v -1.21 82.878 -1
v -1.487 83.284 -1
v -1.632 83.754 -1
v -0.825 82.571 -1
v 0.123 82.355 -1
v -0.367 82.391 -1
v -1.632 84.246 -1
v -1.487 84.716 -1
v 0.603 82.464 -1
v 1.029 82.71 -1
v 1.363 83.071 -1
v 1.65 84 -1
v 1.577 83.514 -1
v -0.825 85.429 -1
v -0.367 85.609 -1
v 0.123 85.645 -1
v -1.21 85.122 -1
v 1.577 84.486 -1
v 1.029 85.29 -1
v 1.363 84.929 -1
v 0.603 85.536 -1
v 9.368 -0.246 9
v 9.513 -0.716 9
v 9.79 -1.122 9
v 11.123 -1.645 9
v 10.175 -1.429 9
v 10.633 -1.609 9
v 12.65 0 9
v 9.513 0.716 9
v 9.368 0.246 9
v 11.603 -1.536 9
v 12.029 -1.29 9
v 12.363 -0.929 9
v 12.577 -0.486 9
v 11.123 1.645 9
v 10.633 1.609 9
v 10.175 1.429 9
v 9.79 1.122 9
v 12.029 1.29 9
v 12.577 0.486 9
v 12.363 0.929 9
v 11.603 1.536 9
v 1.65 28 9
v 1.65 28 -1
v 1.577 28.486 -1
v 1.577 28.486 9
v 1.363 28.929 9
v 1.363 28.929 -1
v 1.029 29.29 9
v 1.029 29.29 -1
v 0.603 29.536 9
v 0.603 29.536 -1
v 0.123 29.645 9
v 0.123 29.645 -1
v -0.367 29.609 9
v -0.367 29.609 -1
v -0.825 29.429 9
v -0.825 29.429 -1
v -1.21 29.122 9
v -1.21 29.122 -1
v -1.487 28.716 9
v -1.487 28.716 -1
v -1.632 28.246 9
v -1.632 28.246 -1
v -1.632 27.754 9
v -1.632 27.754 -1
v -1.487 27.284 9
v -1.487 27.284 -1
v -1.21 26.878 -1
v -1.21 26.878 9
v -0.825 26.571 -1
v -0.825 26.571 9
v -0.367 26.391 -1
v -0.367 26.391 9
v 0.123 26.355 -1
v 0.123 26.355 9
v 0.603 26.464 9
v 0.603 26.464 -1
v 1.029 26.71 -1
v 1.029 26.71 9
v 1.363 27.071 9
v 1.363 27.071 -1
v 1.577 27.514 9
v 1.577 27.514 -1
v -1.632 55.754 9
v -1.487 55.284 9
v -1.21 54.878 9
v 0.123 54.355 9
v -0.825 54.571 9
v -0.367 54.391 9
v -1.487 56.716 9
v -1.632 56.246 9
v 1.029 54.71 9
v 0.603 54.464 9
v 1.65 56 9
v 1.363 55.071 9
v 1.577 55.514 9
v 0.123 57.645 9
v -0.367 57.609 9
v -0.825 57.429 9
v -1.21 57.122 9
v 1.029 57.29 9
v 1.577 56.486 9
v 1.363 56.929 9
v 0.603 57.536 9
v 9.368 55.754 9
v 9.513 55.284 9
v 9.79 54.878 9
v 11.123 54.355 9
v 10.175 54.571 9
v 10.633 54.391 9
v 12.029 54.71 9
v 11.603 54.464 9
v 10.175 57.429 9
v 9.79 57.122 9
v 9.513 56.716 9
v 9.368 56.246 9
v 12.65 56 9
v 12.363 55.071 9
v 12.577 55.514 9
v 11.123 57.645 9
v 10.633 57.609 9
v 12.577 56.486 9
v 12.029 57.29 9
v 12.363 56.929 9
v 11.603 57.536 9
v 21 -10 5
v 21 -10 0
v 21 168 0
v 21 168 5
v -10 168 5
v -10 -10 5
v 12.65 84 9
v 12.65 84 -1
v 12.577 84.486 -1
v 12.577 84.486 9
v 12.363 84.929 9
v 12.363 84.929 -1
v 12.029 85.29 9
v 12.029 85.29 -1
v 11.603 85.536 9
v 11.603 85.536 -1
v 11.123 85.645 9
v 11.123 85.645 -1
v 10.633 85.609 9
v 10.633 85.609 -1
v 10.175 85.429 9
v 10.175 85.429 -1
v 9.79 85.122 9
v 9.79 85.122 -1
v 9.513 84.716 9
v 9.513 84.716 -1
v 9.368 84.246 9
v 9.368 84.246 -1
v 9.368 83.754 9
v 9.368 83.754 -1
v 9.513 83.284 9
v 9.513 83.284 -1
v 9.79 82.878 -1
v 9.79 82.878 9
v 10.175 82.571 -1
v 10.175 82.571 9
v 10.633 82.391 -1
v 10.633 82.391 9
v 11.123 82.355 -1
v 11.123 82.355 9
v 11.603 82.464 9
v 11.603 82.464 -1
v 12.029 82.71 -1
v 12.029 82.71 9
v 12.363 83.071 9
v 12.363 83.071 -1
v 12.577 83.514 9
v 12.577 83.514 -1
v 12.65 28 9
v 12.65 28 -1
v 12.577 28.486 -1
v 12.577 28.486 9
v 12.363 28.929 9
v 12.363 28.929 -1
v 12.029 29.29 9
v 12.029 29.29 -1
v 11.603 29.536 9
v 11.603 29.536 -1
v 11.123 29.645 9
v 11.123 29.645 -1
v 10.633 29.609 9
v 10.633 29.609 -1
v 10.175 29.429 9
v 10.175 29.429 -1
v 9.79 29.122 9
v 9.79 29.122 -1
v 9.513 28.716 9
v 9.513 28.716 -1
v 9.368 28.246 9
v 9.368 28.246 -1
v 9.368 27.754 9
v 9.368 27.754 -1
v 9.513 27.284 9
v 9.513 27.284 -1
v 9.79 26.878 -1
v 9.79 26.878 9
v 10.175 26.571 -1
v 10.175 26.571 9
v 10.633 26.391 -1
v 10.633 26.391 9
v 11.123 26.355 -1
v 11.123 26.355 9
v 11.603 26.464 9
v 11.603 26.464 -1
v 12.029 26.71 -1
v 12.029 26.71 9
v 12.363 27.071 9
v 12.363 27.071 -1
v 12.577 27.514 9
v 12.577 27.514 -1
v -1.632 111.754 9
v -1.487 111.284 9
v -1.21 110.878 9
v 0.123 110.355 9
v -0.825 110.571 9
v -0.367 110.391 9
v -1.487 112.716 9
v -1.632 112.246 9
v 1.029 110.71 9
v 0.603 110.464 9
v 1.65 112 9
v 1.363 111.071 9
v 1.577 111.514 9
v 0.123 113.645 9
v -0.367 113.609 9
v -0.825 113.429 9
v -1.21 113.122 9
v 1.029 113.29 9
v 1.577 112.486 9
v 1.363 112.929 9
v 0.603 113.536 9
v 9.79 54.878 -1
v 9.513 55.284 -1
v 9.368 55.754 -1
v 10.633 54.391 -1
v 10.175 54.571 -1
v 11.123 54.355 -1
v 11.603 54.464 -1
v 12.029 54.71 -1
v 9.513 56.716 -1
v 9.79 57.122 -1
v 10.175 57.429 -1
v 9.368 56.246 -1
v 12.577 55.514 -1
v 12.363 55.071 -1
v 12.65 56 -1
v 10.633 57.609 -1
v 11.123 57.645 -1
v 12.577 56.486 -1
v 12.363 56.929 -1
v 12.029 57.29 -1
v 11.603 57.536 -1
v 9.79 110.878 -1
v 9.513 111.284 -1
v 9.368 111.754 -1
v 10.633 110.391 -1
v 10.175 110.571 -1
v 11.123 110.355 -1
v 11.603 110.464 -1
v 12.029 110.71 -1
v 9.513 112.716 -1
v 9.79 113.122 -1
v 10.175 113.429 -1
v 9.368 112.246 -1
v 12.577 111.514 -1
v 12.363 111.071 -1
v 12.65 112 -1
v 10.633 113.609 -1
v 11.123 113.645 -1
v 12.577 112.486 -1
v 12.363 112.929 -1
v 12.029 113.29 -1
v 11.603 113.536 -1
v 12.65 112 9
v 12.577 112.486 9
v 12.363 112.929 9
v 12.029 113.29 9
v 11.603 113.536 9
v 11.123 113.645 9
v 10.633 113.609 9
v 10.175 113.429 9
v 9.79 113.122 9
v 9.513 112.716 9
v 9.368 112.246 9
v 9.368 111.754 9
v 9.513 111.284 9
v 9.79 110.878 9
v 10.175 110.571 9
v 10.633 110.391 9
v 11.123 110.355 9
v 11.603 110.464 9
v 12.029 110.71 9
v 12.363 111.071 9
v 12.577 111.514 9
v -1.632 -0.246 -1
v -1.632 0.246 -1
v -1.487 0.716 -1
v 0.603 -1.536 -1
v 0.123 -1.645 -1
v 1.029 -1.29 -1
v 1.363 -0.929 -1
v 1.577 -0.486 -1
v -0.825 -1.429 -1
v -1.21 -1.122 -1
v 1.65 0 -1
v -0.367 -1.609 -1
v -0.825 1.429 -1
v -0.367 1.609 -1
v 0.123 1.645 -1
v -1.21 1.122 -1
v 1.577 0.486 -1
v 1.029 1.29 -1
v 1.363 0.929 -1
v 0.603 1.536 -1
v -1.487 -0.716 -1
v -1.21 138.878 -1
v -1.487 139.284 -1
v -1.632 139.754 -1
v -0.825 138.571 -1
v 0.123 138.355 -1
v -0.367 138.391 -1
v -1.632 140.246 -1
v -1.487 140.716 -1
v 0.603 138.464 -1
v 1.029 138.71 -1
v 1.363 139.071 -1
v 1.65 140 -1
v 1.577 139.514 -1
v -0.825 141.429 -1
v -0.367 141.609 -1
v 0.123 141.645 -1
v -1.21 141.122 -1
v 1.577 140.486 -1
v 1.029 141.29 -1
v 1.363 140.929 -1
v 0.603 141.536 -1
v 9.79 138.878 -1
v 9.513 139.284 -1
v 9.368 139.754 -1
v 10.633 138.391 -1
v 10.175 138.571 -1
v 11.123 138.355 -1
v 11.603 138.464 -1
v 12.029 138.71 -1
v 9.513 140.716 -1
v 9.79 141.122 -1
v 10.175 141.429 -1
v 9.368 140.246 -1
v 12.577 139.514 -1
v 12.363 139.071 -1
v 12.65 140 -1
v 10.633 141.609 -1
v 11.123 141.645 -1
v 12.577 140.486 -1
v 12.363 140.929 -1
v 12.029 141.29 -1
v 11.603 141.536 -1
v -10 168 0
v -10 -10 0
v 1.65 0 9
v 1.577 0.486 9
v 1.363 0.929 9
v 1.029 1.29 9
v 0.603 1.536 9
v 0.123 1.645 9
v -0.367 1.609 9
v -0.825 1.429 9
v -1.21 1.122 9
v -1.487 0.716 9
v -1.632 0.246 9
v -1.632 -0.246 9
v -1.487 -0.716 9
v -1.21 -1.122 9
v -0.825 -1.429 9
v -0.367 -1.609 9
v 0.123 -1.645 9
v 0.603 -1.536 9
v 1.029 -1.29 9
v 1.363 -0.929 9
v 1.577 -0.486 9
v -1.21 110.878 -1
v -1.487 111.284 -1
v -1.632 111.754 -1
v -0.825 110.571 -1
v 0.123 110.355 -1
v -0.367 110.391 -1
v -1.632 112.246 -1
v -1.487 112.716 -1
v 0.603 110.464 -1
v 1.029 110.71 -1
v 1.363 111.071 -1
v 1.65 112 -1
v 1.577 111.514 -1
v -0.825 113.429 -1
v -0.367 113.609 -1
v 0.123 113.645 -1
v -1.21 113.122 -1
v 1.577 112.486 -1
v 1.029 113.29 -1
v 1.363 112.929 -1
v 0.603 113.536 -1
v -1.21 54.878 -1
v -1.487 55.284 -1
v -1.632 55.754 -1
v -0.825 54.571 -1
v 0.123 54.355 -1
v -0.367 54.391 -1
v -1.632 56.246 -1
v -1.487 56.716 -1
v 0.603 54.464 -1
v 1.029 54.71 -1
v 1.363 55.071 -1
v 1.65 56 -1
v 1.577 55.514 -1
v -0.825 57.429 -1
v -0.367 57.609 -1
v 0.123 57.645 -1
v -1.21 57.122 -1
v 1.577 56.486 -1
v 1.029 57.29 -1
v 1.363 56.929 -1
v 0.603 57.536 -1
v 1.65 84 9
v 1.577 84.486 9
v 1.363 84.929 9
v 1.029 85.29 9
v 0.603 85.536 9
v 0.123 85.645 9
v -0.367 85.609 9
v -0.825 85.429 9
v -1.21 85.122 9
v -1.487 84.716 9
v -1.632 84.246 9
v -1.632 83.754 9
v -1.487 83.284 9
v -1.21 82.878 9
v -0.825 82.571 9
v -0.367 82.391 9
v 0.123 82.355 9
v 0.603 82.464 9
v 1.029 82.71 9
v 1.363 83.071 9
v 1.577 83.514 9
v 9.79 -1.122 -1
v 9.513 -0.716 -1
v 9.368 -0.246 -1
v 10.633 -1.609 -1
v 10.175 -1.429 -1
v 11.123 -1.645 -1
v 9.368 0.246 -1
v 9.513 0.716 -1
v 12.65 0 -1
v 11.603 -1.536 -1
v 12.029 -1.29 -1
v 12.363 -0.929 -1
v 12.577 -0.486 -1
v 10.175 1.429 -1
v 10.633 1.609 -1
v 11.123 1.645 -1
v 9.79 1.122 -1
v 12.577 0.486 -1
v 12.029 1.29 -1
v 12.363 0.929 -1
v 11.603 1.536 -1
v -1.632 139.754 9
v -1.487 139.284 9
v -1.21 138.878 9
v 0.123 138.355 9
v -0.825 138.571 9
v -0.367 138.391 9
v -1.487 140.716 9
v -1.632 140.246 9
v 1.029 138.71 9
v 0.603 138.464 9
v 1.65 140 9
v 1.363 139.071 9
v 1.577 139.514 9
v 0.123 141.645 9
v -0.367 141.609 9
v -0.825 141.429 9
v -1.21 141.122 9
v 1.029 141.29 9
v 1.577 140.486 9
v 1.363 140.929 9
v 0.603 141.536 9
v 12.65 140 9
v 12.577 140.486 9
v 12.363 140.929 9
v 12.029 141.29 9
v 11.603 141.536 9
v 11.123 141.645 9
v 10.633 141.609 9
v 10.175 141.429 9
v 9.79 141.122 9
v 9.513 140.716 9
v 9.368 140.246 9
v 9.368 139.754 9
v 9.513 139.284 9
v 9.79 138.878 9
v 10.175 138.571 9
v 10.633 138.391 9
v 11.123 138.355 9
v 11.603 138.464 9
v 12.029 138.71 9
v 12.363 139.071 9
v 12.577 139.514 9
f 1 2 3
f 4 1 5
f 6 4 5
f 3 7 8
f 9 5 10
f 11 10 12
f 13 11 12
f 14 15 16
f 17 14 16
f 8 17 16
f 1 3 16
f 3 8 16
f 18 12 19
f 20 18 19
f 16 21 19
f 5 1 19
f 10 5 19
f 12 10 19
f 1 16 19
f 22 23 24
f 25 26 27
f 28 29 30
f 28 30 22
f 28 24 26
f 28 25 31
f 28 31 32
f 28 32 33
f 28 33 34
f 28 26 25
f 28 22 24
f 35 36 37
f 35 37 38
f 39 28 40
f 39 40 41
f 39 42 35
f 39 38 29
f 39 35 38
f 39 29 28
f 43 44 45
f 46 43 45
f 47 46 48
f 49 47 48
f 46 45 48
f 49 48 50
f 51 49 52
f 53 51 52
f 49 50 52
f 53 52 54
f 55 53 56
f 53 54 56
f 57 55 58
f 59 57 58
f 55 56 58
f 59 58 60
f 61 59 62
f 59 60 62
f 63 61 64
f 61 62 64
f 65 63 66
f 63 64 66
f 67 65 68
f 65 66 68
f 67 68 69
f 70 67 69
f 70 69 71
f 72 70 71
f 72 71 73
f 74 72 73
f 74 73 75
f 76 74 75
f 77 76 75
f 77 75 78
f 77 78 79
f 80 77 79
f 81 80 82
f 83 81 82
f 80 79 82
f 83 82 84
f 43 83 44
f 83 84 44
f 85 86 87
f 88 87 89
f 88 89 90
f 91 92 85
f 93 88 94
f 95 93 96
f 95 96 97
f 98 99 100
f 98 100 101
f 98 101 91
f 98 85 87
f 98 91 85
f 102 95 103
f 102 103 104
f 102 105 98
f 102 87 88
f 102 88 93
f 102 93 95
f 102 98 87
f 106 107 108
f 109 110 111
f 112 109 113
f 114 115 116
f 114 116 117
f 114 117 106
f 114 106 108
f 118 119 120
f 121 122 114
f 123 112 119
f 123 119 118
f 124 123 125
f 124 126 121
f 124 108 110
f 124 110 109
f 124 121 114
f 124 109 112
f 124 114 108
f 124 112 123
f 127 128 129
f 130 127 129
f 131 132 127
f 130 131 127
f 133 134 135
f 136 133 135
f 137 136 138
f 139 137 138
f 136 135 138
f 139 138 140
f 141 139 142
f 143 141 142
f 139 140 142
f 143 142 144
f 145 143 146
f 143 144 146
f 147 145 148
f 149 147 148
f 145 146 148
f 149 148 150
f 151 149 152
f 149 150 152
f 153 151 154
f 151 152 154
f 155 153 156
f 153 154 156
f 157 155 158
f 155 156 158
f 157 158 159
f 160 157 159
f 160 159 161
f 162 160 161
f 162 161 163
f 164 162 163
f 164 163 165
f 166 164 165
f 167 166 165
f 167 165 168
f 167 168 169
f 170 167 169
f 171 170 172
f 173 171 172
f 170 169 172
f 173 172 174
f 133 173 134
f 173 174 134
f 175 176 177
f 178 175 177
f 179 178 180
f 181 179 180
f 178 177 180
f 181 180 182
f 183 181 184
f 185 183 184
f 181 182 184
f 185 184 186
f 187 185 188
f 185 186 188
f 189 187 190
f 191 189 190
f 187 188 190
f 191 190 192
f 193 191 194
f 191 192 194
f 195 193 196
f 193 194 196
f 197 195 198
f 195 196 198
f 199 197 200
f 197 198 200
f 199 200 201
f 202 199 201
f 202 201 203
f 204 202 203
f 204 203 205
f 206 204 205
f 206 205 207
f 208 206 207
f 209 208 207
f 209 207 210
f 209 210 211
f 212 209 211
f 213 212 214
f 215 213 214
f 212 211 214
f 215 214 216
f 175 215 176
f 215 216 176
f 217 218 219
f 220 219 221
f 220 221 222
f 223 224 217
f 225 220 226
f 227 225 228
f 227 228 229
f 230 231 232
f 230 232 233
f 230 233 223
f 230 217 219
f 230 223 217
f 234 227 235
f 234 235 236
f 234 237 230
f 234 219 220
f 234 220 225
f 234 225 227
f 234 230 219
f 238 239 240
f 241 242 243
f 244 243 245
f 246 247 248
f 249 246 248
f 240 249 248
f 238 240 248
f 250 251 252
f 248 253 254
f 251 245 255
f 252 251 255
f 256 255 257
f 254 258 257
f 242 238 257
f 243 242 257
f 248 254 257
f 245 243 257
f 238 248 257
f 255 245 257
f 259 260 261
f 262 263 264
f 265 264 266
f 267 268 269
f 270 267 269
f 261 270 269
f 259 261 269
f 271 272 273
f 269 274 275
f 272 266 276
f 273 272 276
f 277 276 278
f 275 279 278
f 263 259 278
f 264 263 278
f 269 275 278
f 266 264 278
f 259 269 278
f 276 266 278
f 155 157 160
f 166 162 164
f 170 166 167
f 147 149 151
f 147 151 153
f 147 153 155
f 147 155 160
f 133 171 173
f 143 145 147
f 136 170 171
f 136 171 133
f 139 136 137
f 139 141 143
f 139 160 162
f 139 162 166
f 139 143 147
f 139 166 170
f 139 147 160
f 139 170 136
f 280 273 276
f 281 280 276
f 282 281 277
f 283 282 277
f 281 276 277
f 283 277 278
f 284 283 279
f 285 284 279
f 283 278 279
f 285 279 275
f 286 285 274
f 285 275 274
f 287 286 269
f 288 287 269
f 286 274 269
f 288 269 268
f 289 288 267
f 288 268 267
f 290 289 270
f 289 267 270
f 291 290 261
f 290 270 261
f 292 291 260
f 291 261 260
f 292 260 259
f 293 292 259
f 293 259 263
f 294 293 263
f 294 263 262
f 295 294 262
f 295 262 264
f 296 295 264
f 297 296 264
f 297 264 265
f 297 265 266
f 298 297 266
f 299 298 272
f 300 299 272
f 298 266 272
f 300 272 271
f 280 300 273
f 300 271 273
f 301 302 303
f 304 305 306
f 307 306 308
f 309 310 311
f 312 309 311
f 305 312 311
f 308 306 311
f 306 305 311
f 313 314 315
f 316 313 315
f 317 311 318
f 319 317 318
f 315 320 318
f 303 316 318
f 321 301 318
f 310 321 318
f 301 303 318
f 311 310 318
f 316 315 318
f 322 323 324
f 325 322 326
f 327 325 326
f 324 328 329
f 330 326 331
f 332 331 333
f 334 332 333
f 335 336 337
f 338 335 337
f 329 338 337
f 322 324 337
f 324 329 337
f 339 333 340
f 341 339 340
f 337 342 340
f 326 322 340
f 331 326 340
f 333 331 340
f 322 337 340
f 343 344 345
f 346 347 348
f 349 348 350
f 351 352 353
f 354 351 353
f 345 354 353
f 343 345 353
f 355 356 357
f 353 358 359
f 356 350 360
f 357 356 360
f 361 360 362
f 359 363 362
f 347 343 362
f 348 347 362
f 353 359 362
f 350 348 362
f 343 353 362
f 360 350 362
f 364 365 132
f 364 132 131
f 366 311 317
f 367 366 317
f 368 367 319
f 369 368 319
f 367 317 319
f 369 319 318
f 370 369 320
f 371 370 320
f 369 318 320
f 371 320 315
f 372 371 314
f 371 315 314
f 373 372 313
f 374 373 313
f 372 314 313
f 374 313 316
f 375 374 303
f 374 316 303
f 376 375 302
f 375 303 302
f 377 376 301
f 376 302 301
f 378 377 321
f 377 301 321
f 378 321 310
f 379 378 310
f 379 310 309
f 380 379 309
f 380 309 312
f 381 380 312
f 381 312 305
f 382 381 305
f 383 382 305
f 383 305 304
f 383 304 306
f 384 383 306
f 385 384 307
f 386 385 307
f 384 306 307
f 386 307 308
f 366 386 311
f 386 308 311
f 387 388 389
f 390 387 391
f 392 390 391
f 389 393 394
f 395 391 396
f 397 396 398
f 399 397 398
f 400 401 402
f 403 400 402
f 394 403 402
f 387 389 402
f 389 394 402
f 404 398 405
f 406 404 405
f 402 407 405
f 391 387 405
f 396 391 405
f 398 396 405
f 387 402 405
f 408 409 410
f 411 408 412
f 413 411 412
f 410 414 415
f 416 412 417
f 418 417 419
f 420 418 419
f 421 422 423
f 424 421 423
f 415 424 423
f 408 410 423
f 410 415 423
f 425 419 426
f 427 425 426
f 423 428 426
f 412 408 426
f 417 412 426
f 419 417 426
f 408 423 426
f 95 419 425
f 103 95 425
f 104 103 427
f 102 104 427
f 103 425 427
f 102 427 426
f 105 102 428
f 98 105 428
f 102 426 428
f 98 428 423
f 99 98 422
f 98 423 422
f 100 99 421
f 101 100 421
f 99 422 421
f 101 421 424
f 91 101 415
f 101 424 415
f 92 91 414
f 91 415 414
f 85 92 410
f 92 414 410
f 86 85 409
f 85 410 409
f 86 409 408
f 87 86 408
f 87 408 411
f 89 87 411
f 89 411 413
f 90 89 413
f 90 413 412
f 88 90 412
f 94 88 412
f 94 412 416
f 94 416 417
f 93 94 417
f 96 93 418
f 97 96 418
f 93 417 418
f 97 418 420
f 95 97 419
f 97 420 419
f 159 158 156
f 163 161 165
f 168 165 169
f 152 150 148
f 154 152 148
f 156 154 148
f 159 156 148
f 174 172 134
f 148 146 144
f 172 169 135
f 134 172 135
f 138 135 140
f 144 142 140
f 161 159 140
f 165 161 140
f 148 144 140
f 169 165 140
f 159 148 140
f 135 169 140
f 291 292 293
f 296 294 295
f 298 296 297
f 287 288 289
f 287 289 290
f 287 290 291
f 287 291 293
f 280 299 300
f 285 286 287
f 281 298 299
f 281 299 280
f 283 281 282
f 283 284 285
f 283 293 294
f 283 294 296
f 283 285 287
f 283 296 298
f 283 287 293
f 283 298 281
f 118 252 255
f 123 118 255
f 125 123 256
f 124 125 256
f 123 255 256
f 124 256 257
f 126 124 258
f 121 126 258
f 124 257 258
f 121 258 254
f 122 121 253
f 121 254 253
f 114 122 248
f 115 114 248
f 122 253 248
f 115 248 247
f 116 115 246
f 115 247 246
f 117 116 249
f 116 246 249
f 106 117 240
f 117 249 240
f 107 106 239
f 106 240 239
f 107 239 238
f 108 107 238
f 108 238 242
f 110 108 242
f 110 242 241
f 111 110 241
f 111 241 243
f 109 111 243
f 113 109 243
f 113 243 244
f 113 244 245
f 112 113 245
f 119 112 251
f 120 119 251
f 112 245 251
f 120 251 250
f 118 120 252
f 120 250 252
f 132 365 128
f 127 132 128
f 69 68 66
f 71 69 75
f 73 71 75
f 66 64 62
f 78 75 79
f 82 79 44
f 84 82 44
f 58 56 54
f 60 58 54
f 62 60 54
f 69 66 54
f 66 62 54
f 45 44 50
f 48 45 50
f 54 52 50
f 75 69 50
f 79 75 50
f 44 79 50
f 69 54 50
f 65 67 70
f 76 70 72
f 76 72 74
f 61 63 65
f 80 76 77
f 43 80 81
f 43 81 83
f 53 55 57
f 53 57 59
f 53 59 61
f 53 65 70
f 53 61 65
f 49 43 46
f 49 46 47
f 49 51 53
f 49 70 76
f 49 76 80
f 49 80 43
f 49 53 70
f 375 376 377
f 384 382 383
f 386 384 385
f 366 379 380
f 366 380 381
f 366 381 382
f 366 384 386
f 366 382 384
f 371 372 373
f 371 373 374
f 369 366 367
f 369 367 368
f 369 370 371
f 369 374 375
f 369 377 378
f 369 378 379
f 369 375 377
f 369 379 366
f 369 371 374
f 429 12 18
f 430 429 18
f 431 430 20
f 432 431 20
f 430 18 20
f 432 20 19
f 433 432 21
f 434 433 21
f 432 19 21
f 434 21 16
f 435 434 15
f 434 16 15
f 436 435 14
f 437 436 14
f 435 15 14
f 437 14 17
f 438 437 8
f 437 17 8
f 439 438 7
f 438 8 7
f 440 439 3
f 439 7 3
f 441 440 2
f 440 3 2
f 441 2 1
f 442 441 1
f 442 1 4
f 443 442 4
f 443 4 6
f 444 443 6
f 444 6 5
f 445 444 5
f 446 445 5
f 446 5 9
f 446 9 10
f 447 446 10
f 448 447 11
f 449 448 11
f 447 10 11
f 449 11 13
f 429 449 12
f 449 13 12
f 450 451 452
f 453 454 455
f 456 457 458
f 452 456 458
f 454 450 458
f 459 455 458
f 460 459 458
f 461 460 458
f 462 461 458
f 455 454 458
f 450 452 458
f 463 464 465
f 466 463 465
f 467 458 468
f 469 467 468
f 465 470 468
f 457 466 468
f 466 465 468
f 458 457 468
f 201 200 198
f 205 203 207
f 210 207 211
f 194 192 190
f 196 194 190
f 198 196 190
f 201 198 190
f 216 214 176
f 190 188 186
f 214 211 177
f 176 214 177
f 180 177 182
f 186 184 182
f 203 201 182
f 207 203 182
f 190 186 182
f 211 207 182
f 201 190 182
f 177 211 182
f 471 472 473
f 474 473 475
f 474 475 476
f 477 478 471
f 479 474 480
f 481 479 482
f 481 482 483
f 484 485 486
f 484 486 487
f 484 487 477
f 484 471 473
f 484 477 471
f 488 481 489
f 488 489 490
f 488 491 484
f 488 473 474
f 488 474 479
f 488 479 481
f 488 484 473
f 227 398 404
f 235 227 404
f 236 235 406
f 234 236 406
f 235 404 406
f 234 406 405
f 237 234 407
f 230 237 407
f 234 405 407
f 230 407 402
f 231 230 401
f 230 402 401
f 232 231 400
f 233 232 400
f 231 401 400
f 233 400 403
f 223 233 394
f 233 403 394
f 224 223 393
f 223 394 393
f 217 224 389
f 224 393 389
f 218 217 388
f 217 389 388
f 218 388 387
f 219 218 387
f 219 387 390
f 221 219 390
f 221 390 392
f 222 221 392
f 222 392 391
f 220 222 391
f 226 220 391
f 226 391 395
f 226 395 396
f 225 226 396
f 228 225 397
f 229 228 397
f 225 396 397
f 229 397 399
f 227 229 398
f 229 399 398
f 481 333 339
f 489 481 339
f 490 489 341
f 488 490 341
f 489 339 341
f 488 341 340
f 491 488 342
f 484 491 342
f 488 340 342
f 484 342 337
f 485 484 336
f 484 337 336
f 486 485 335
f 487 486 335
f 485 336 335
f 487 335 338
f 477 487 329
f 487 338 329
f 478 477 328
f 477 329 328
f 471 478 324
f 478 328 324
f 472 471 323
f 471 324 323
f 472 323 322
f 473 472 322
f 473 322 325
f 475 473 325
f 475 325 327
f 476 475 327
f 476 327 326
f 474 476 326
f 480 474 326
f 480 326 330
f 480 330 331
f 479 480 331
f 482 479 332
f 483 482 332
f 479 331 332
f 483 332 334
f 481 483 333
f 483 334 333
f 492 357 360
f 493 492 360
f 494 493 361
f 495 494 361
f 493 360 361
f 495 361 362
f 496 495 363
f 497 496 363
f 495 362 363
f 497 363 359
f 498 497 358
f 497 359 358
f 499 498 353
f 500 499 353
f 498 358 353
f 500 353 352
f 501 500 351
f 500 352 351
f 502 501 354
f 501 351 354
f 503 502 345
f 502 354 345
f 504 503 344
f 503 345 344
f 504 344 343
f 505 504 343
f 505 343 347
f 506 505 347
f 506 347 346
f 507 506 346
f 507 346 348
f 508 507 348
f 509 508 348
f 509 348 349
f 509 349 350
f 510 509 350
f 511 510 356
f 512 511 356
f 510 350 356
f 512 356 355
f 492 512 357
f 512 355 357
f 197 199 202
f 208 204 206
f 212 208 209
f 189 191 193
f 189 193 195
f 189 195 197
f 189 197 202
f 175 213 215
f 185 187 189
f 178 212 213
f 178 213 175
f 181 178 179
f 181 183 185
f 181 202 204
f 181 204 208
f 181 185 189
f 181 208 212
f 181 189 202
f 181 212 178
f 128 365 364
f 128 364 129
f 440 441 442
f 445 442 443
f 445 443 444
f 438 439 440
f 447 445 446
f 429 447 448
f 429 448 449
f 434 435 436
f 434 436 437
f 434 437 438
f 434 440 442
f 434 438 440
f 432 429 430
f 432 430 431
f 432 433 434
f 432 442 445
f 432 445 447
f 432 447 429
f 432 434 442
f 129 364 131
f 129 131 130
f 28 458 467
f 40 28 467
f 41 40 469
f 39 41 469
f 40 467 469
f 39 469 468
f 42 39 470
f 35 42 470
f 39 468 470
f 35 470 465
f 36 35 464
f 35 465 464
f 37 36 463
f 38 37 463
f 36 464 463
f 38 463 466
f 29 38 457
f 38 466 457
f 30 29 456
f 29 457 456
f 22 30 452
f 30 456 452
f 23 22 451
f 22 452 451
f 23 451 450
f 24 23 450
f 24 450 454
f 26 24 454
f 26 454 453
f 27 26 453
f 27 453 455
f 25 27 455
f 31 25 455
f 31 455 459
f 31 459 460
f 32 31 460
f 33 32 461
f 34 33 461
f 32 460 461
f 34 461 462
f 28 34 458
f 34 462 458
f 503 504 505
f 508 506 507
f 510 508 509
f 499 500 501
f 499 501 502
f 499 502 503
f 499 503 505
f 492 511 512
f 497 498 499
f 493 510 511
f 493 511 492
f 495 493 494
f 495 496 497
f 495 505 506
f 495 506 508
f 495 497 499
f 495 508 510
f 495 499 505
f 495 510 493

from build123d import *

# Parameters (mm, degrees)
BASE_W          = 31
BASE_H          = 178
BASE_DEPTH      = 5
SCREW0_R        = 1.65
SCREW0_DEPTH    = 10
SCREW0001_R     = 1.65
SCREW0001_DEPTH = 10
SCREW1_R        = 1.65
SCREW1_DEPTH    = 10
SCREW1001_R     = 1.65
SCREW1001_DEPTH = 10
SCREW2_R        = 1.65
SCREW2_DEPTH    = 10
SCREW2001_R     = 1.65
SCREW2001_DEPTH = 10
SCREW3_R        = 1.65
SCREW3_DEPTH    = 10
SCREW3001_R     = 1.65
SCREW3001_DEPTH = 10
SCREW4_R        = 1.65
SCREW4_DEPTH    = 10
SCREW4001_R     = 1.65
SCREW4001_DEPTH = 10
SCREW5_R        = 1.65
SCREW5_DEPTH    = 10
SCREW5001_R     = 1.65
SCREW5001_DEPTH = 10


with BuildPart() as base:
    # base → base (new body)
    with BuildSketch(Plane(origin=(-10, -10, 0), x_dir=(1, 0, 0), z_dir=(0, 0, 1))):
        with Locations((15.5, 89)):
            Rectangle(BASE_W, BASE_H)
    extrude(amount=BASE_DEPTH)


with BuildPart() as screw0:
    # screw0 → screw0 (new body)
    with BuildSketch(Plane.XY.offset(-1)):
        Circle(SCREW0_R)
    extrude(amount=SCREW0_DEPTH)


with BuildPart() as screw0001:
    # screw0001 → screw0001 (new body)
    with BuildSketch(Plane(origin=(11, 0, -1), x_dir=(1, 0, 0), z_dir=(0, 0, 1))):
        Circle(SCREW0001_R)
    extrude(amount=SCREW0001_DEPTH)


with BuildPart() as screw1:
    # screw1 → screw1 (new body)
    with BuildSketch(Plane(origin=(0, 28, -1), x_dir=(1, 0, 0), z_dir=(0, 0, 1))):
        Circle(SCREW1_R)
    extrude(amount=SCREW1_DEPTH)


with BuildPart() as screw1001:
    # screw1001 → screw1001 (new body)
    with BuildSketch(Plane(origin=(11, 28, -1), x_dir=(1, 0, 0), z_dir=(0, 0, 1))):
        Circle(SCREW1001_R)
    extrude(amount=SCREW1001_DEPTH)


with BuildPart() as screw2:
    # screw2 → screw2 (new body)
    with BuildSketch(Plane(origin=(0, 56, -1), x_dir=(1, 0, 0), z_dir=(0, 0, 1))):
        Circle(SCREW2_R)
    extrude(amount=SCREW2_DEPTH)


with BuildPart() as screw2001:
    # screw2001 → screw2001 (new body)
    with BuildSketch(Plane(origin=(11, 56, -1), x_dir=(1, 0, 0), z_dir=(0, 0, 1))):
        Circle(SCREW2001_R)
    extrude(amount=SCREW2001_DEPTH)


with BuildPart() as screw3:
    # screw3 → screw3 (new body)
    with BuildSketch(Plane(origin=(0, 84, -1), x_dir=(1, 0, 0), z_dir=(0, 0, 1))):
        Circle(SCREW3_R)
    extrude(amount=SCREW3_DEPTH)


with BuildPart() as screw3001:
    # screw3001 → screw3001 (new body)
    with BuildSketch(Plane(origin=(11, 84, -1), x_dir=(1, 0, 0), z_dir=(0, 0, 1))):
        Circle(SCREW3001_R)
    extrude(amount=SCREW3001_DEPTH)


with BuildPart() as screw4:
    # screw4 → screw4 (new body)
    with BuildSketch(Plane(origin=(0, 112, -1), x_dir=(1, 0, 0), z_dir=(0, 0, 1))):
        Circle(SCREW4_R)
    extrude(amount=SCREW4_DEPTH)


with BuildPart() as screw4001:
    # screw4001 → screw4001 (new body)
    with BuildSketch(Plane(origin=(11, 112, -1), x_dir=(1, 0, 0), z_dir=(0, 0, 1))):
        Circle(SCREW4001_R)
    extrude(amount=SCREW4001_DEPTH)


with BuildPart() as screw5:
    # screw5 → screw5 (new body)
    with BuildSketch(Plane(origin=(0, 140, -1), x_dir=(1, 0, 0), z_dir=(0, 0, 1))):
        Circle(SCREW5_R)
    extrude(amount=SCREW5_DEPTH)


with BuildPart() as screw5001:
    # screw5001 → screw5001 (new body)
    with BuildSketch(Plane(origin=(11, 140, -1), x_dir=(1, 0, 0), z_dir=(0, 0, 1))):
        Circle(SCREW5001_R)
    extrude(amount=SCREW5001_DEPTH)


solid = Compound([base.part, screw0.part, screw0001.part, screw1.part, screw1001.part, screw2.part, screw2001.part, screw3.part, screw3001.part, screw4.part, screw4001.part, screw5.part, screw5001.part])
